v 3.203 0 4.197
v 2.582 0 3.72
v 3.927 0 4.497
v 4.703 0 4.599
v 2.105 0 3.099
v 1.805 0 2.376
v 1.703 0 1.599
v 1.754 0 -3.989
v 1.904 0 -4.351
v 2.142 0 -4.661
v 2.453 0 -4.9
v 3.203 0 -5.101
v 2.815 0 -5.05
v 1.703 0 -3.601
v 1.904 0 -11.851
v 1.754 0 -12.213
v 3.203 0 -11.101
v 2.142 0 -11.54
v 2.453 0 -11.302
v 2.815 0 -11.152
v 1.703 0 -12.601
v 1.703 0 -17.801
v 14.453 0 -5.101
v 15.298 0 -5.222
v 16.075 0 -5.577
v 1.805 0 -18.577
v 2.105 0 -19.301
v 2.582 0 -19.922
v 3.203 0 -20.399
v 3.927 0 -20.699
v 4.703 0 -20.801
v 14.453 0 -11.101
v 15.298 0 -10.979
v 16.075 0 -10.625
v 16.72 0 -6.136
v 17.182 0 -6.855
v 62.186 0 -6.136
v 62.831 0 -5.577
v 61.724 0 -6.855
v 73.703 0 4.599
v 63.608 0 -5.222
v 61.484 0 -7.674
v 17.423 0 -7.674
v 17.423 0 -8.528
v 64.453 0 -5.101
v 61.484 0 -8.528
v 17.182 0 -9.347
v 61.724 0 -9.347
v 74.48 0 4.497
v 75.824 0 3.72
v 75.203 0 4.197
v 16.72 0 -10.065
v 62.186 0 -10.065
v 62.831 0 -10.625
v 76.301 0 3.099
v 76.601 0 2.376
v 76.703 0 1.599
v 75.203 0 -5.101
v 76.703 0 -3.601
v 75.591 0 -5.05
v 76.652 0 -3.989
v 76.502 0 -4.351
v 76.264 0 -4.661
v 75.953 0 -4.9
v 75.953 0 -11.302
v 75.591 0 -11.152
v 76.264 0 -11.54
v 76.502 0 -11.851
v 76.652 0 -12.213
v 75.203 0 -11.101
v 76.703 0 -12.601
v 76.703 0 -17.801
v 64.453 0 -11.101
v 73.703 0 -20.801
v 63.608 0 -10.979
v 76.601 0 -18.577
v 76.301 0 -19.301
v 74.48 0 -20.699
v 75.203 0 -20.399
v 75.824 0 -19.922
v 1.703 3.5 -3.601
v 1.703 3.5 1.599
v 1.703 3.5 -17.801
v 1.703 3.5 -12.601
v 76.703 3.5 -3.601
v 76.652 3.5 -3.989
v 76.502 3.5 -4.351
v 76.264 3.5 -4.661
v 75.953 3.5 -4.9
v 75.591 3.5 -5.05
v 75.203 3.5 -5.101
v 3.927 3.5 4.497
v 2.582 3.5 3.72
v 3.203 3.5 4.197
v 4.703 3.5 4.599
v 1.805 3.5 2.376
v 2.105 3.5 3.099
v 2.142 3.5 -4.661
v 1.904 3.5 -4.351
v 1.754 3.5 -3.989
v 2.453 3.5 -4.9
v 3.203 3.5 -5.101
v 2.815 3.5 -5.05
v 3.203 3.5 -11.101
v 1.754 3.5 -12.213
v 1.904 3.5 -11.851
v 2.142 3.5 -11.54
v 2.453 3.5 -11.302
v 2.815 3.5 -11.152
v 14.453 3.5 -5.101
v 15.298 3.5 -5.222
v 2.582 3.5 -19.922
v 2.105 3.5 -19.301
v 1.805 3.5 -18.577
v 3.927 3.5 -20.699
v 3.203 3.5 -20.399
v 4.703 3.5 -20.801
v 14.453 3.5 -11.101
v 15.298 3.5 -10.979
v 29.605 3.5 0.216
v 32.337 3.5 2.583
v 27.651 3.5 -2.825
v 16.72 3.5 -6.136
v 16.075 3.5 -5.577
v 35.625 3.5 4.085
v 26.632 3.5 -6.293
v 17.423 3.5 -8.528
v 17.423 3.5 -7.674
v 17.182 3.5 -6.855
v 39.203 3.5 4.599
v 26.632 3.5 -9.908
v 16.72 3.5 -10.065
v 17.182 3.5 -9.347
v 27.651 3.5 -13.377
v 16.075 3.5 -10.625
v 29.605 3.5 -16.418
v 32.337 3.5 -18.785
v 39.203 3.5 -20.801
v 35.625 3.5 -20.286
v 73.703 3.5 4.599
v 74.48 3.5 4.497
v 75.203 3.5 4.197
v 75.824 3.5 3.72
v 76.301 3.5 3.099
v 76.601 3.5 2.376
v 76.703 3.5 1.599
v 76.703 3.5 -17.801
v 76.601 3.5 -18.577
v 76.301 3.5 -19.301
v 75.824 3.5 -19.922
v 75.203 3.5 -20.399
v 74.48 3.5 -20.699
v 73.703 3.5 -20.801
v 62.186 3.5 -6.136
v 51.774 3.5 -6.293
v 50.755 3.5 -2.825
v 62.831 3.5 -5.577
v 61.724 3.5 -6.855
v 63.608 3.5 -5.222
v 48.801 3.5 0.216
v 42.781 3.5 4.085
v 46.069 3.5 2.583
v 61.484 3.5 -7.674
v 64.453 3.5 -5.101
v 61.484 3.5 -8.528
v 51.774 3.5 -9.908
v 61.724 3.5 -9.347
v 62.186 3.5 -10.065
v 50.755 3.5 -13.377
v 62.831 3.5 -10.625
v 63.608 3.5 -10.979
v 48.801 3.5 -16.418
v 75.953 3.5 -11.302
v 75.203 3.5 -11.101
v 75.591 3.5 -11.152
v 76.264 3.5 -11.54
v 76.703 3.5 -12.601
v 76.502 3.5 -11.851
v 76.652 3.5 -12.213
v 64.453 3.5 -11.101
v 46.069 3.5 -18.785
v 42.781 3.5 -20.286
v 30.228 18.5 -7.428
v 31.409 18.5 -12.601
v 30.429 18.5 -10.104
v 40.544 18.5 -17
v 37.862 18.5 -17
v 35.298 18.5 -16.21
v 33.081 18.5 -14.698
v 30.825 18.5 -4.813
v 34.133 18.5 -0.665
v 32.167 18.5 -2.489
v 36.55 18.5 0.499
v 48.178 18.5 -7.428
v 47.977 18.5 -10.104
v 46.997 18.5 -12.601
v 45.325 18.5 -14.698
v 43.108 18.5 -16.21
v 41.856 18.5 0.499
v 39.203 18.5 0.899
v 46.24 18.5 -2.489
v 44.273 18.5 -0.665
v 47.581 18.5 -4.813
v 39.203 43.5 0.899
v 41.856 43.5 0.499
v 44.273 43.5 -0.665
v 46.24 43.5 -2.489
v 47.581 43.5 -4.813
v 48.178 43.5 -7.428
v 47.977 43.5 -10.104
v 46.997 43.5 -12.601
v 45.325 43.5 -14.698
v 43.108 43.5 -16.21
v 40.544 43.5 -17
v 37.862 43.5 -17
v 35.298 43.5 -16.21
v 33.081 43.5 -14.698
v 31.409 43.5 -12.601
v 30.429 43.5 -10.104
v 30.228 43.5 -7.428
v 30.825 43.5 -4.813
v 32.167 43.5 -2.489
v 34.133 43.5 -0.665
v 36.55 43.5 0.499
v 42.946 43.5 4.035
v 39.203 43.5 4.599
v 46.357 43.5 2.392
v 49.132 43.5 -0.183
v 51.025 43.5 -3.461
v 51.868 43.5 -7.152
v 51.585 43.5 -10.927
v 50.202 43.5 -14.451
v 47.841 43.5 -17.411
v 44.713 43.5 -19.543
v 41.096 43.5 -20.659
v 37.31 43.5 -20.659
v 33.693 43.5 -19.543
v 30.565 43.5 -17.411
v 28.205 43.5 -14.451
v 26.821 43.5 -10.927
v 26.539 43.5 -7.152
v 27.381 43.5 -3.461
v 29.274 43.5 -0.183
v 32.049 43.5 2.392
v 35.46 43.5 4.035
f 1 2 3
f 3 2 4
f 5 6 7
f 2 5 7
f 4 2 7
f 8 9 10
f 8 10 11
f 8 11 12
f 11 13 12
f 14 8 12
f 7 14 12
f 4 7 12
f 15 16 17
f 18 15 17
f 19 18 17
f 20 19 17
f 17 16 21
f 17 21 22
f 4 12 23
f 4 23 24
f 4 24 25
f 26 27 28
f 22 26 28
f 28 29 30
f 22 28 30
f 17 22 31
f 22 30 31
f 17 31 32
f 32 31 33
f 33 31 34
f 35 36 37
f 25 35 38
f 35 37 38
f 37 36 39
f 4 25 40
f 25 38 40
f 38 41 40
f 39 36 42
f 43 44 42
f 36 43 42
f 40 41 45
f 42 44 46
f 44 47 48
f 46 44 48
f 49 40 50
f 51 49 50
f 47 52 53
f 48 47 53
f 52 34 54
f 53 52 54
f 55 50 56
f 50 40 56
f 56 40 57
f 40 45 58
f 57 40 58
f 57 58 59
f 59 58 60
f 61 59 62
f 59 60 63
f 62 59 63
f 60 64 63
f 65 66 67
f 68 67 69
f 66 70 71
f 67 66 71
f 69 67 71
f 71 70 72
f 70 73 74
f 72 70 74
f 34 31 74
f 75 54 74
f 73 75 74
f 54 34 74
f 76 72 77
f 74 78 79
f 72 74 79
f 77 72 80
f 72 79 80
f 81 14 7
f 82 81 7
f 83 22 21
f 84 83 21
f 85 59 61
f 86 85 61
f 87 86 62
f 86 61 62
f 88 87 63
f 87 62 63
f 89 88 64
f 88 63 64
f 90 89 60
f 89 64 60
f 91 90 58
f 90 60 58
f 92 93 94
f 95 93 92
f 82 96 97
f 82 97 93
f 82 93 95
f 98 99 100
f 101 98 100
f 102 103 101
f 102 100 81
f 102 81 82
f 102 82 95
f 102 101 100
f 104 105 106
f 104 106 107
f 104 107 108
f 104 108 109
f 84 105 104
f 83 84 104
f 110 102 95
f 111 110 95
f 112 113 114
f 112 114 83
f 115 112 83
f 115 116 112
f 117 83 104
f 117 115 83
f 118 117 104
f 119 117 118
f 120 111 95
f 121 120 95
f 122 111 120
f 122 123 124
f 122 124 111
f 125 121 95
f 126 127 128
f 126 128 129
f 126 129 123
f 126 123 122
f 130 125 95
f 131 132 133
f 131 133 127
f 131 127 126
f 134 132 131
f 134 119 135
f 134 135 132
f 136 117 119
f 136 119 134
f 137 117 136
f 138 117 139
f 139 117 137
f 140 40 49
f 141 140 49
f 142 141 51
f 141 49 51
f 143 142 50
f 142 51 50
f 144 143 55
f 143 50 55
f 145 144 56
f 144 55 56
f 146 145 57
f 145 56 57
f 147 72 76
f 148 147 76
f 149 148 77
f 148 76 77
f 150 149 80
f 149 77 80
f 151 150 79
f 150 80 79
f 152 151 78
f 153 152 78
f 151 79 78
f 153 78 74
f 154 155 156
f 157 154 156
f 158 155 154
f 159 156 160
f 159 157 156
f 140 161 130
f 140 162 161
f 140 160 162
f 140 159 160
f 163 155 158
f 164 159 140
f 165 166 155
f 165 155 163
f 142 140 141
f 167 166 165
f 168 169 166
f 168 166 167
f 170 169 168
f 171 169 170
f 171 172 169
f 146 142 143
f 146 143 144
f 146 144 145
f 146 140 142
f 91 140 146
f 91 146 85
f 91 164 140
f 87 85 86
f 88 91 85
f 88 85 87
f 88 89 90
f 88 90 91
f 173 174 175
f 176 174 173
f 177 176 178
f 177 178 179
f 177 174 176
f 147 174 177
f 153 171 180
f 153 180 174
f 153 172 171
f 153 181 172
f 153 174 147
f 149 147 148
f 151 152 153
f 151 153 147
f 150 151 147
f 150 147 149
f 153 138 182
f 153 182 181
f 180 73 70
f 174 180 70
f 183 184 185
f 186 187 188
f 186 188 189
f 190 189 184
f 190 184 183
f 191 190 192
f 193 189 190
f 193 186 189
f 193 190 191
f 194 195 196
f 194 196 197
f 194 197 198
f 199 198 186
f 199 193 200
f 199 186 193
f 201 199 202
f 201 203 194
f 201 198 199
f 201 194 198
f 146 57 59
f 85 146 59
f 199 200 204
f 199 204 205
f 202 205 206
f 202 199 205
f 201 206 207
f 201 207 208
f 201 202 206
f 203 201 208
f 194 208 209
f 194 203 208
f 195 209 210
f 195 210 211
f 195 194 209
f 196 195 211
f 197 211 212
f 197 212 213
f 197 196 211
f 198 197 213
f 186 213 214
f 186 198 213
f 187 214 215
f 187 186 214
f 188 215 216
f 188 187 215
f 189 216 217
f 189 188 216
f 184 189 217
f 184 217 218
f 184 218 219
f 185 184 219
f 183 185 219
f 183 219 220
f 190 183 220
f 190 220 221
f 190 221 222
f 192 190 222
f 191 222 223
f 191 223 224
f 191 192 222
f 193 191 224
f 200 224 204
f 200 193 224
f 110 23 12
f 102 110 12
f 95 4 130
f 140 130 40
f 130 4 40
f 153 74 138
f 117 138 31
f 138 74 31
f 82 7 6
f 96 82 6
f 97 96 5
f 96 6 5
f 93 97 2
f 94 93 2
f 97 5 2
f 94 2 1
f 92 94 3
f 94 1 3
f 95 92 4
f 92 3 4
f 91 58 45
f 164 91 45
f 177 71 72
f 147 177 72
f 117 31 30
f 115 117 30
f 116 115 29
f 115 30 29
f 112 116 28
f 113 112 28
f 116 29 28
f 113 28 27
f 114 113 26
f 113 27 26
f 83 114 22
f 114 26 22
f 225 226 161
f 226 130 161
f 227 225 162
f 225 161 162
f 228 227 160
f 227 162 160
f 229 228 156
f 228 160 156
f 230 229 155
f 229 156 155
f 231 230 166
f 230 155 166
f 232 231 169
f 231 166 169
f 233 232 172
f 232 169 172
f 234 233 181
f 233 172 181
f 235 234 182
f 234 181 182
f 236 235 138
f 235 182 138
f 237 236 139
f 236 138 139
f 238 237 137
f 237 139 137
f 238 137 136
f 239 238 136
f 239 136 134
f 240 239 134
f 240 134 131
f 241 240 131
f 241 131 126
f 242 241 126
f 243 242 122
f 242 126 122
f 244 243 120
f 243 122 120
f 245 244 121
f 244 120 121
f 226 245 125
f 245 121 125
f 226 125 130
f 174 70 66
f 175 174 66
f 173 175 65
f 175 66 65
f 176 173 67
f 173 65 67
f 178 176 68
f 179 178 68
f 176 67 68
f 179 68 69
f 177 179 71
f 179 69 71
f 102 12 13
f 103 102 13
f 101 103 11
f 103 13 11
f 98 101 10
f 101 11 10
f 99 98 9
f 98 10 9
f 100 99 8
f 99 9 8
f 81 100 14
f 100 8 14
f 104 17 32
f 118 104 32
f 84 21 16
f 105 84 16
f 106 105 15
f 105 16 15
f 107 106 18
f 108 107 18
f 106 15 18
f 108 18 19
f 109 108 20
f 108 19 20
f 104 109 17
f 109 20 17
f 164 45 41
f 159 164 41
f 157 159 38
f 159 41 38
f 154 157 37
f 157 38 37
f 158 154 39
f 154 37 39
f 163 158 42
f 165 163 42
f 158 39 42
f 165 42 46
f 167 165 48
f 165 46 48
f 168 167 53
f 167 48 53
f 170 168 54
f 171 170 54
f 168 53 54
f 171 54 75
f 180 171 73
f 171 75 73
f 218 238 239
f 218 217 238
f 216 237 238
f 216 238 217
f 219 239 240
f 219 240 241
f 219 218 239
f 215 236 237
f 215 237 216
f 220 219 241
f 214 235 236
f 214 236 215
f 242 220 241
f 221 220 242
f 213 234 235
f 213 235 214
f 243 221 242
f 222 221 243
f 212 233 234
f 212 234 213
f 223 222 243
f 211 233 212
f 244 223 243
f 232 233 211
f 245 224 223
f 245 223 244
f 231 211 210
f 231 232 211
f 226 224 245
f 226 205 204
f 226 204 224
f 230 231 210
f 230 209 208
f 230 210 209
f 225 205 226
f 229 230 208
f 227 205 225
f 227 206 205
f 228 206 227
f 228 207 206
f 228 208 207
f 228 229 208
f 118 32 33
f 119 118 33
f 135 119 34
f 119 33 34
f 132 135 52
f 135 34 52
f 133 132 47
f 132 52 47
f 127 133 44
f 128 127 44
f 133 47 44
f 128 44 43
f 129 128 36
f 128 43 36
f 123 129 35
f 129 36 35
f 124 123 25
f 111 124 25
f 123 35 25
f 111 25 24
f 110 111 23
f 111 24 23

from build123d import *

# Parameters (mm, degrees)
BOSS_EXTRUDE2_DEPTH = 3.5
SKETCH4_R           = 12.7
BOSS_EXTRUDE3_DEPTH = 15
SKETCH5_R           = 12.7
SKETCH5_R_2         = 9
BOSS_EXTRUDE4_DEPTH = 25


with BuildPart() as part:
    # Sketch1 → Boss-Extrude2 (new body)
    with BuildSketch(Plane(origin=(0, 0, 0), x_dir=(1, 0, 0), z_dir=(0, 1, 0))):
        with BuildLine():
            Line((64.453053112, 11.100827963), (75.203053112, 11.100827963))
            ThreePointArc((75.203053112, 11.100827963), (76.263713284, 11.540167791), (76.703053112, 12.600827963))
            Line((76.703053112, 12.600827963), (76.703053112, 17.800827963))
            ThreePointArc((76.703053112, 17.800827963), (75.824373455, 19.922148306), (73.703053112, 20.800827963))
            Line((73.703053112, 20.800827963), (4.703053112, 20.800827963))
            ThreePointArc((4.703053112, 20.800827963), (2.581732768, 19.922148306), (1.703053112, 17.800827963))
            Line((1.703053112, 17.800827963), (1.703053112, 12.600827963))
            ThreePointArc((1.703053112, 12.600827963), (2.14239294, 11.540167791), (3.203053112, 11.100827963))
            Line((3.203053112, 11.100827963), (14.453053112, 11.100827963))
            ThreePointArc((14.453053112, 11.100827963), (17.453053112, 8.100827963), (14.453053112, 5.100827963))
            Line((14.453053112, 5.100827963), (3.203053112, 5.100827963))
            ThreePointArc((3.203053112, 5.100827963), (2.14239294, 4.661488134), (1.703053112, 3.600827963))
            Line((1.703053112, 3.600827963), (1.703053112, -1.599172037))
            ThreePointArc((1.703053112, -1.599172037), (2.581732768, -3.720492381), (4.703053112, -4.599172037))
            Line((4.703053112, -4.599172037), (73.703053112, -4.599172037))
            ThreePointArc((73.703053112, -4.599172037), (75.824373455, -3.720492381), (76.703053112, -1.599172037))
            Line((76.703053112, -1.599172037), (76.703053112, 3.600827963))
            ThreePointArc((76.703053112, 3.600827963), (76.263713284, 4.661488134), (75.203053112, 5.100827963))
            Line((75.203053112, 5.100827963), (64.453053112, 5.100827963))
            ThreePointArc((64.453053112, 5.100827963), (61.453053112, 8.100827963), (64.453053112, 11.100827963))
        make_face()
    extrude(amount=BOSS_EXTRUDE2_DEPTH)

    # Sketch4 → Boss-Extrude3 (add)
    with BuildSketch(Plane(origin=(0, 3.5, 0), x_dir=(1, 0, 0), z_dir=(0, 1, 0))):
        with Locations(Location((39.203053112, 8.100827963, 0), (0, 0, 270))):
            Circle(SKETCH4_R)
    extrude(amount=BOSS_EXTRUDE3_DEPTH)

    # Sketch5 → Boss-Extrude4 (add)
    with BuildSketch(Plane(origin=(0, 18.5, 0), x_dir=(1, 0, 0), z_dir=(0, 1, 0))):
        with Locations(Location((39.203053112, 8.100827963, 0), (0, 0, 270))):
            Circle(SKETCH5_R)
        with Locations(Location((39.203053112, 8.100827963, 0), (0, 0, 270))):
            Circle(SKETCH5_R_2, mode=Mode.SUBTRACT)
    extrude(amount=BOSS_EXTRUDE4_DEPTH)


solid = part.part
